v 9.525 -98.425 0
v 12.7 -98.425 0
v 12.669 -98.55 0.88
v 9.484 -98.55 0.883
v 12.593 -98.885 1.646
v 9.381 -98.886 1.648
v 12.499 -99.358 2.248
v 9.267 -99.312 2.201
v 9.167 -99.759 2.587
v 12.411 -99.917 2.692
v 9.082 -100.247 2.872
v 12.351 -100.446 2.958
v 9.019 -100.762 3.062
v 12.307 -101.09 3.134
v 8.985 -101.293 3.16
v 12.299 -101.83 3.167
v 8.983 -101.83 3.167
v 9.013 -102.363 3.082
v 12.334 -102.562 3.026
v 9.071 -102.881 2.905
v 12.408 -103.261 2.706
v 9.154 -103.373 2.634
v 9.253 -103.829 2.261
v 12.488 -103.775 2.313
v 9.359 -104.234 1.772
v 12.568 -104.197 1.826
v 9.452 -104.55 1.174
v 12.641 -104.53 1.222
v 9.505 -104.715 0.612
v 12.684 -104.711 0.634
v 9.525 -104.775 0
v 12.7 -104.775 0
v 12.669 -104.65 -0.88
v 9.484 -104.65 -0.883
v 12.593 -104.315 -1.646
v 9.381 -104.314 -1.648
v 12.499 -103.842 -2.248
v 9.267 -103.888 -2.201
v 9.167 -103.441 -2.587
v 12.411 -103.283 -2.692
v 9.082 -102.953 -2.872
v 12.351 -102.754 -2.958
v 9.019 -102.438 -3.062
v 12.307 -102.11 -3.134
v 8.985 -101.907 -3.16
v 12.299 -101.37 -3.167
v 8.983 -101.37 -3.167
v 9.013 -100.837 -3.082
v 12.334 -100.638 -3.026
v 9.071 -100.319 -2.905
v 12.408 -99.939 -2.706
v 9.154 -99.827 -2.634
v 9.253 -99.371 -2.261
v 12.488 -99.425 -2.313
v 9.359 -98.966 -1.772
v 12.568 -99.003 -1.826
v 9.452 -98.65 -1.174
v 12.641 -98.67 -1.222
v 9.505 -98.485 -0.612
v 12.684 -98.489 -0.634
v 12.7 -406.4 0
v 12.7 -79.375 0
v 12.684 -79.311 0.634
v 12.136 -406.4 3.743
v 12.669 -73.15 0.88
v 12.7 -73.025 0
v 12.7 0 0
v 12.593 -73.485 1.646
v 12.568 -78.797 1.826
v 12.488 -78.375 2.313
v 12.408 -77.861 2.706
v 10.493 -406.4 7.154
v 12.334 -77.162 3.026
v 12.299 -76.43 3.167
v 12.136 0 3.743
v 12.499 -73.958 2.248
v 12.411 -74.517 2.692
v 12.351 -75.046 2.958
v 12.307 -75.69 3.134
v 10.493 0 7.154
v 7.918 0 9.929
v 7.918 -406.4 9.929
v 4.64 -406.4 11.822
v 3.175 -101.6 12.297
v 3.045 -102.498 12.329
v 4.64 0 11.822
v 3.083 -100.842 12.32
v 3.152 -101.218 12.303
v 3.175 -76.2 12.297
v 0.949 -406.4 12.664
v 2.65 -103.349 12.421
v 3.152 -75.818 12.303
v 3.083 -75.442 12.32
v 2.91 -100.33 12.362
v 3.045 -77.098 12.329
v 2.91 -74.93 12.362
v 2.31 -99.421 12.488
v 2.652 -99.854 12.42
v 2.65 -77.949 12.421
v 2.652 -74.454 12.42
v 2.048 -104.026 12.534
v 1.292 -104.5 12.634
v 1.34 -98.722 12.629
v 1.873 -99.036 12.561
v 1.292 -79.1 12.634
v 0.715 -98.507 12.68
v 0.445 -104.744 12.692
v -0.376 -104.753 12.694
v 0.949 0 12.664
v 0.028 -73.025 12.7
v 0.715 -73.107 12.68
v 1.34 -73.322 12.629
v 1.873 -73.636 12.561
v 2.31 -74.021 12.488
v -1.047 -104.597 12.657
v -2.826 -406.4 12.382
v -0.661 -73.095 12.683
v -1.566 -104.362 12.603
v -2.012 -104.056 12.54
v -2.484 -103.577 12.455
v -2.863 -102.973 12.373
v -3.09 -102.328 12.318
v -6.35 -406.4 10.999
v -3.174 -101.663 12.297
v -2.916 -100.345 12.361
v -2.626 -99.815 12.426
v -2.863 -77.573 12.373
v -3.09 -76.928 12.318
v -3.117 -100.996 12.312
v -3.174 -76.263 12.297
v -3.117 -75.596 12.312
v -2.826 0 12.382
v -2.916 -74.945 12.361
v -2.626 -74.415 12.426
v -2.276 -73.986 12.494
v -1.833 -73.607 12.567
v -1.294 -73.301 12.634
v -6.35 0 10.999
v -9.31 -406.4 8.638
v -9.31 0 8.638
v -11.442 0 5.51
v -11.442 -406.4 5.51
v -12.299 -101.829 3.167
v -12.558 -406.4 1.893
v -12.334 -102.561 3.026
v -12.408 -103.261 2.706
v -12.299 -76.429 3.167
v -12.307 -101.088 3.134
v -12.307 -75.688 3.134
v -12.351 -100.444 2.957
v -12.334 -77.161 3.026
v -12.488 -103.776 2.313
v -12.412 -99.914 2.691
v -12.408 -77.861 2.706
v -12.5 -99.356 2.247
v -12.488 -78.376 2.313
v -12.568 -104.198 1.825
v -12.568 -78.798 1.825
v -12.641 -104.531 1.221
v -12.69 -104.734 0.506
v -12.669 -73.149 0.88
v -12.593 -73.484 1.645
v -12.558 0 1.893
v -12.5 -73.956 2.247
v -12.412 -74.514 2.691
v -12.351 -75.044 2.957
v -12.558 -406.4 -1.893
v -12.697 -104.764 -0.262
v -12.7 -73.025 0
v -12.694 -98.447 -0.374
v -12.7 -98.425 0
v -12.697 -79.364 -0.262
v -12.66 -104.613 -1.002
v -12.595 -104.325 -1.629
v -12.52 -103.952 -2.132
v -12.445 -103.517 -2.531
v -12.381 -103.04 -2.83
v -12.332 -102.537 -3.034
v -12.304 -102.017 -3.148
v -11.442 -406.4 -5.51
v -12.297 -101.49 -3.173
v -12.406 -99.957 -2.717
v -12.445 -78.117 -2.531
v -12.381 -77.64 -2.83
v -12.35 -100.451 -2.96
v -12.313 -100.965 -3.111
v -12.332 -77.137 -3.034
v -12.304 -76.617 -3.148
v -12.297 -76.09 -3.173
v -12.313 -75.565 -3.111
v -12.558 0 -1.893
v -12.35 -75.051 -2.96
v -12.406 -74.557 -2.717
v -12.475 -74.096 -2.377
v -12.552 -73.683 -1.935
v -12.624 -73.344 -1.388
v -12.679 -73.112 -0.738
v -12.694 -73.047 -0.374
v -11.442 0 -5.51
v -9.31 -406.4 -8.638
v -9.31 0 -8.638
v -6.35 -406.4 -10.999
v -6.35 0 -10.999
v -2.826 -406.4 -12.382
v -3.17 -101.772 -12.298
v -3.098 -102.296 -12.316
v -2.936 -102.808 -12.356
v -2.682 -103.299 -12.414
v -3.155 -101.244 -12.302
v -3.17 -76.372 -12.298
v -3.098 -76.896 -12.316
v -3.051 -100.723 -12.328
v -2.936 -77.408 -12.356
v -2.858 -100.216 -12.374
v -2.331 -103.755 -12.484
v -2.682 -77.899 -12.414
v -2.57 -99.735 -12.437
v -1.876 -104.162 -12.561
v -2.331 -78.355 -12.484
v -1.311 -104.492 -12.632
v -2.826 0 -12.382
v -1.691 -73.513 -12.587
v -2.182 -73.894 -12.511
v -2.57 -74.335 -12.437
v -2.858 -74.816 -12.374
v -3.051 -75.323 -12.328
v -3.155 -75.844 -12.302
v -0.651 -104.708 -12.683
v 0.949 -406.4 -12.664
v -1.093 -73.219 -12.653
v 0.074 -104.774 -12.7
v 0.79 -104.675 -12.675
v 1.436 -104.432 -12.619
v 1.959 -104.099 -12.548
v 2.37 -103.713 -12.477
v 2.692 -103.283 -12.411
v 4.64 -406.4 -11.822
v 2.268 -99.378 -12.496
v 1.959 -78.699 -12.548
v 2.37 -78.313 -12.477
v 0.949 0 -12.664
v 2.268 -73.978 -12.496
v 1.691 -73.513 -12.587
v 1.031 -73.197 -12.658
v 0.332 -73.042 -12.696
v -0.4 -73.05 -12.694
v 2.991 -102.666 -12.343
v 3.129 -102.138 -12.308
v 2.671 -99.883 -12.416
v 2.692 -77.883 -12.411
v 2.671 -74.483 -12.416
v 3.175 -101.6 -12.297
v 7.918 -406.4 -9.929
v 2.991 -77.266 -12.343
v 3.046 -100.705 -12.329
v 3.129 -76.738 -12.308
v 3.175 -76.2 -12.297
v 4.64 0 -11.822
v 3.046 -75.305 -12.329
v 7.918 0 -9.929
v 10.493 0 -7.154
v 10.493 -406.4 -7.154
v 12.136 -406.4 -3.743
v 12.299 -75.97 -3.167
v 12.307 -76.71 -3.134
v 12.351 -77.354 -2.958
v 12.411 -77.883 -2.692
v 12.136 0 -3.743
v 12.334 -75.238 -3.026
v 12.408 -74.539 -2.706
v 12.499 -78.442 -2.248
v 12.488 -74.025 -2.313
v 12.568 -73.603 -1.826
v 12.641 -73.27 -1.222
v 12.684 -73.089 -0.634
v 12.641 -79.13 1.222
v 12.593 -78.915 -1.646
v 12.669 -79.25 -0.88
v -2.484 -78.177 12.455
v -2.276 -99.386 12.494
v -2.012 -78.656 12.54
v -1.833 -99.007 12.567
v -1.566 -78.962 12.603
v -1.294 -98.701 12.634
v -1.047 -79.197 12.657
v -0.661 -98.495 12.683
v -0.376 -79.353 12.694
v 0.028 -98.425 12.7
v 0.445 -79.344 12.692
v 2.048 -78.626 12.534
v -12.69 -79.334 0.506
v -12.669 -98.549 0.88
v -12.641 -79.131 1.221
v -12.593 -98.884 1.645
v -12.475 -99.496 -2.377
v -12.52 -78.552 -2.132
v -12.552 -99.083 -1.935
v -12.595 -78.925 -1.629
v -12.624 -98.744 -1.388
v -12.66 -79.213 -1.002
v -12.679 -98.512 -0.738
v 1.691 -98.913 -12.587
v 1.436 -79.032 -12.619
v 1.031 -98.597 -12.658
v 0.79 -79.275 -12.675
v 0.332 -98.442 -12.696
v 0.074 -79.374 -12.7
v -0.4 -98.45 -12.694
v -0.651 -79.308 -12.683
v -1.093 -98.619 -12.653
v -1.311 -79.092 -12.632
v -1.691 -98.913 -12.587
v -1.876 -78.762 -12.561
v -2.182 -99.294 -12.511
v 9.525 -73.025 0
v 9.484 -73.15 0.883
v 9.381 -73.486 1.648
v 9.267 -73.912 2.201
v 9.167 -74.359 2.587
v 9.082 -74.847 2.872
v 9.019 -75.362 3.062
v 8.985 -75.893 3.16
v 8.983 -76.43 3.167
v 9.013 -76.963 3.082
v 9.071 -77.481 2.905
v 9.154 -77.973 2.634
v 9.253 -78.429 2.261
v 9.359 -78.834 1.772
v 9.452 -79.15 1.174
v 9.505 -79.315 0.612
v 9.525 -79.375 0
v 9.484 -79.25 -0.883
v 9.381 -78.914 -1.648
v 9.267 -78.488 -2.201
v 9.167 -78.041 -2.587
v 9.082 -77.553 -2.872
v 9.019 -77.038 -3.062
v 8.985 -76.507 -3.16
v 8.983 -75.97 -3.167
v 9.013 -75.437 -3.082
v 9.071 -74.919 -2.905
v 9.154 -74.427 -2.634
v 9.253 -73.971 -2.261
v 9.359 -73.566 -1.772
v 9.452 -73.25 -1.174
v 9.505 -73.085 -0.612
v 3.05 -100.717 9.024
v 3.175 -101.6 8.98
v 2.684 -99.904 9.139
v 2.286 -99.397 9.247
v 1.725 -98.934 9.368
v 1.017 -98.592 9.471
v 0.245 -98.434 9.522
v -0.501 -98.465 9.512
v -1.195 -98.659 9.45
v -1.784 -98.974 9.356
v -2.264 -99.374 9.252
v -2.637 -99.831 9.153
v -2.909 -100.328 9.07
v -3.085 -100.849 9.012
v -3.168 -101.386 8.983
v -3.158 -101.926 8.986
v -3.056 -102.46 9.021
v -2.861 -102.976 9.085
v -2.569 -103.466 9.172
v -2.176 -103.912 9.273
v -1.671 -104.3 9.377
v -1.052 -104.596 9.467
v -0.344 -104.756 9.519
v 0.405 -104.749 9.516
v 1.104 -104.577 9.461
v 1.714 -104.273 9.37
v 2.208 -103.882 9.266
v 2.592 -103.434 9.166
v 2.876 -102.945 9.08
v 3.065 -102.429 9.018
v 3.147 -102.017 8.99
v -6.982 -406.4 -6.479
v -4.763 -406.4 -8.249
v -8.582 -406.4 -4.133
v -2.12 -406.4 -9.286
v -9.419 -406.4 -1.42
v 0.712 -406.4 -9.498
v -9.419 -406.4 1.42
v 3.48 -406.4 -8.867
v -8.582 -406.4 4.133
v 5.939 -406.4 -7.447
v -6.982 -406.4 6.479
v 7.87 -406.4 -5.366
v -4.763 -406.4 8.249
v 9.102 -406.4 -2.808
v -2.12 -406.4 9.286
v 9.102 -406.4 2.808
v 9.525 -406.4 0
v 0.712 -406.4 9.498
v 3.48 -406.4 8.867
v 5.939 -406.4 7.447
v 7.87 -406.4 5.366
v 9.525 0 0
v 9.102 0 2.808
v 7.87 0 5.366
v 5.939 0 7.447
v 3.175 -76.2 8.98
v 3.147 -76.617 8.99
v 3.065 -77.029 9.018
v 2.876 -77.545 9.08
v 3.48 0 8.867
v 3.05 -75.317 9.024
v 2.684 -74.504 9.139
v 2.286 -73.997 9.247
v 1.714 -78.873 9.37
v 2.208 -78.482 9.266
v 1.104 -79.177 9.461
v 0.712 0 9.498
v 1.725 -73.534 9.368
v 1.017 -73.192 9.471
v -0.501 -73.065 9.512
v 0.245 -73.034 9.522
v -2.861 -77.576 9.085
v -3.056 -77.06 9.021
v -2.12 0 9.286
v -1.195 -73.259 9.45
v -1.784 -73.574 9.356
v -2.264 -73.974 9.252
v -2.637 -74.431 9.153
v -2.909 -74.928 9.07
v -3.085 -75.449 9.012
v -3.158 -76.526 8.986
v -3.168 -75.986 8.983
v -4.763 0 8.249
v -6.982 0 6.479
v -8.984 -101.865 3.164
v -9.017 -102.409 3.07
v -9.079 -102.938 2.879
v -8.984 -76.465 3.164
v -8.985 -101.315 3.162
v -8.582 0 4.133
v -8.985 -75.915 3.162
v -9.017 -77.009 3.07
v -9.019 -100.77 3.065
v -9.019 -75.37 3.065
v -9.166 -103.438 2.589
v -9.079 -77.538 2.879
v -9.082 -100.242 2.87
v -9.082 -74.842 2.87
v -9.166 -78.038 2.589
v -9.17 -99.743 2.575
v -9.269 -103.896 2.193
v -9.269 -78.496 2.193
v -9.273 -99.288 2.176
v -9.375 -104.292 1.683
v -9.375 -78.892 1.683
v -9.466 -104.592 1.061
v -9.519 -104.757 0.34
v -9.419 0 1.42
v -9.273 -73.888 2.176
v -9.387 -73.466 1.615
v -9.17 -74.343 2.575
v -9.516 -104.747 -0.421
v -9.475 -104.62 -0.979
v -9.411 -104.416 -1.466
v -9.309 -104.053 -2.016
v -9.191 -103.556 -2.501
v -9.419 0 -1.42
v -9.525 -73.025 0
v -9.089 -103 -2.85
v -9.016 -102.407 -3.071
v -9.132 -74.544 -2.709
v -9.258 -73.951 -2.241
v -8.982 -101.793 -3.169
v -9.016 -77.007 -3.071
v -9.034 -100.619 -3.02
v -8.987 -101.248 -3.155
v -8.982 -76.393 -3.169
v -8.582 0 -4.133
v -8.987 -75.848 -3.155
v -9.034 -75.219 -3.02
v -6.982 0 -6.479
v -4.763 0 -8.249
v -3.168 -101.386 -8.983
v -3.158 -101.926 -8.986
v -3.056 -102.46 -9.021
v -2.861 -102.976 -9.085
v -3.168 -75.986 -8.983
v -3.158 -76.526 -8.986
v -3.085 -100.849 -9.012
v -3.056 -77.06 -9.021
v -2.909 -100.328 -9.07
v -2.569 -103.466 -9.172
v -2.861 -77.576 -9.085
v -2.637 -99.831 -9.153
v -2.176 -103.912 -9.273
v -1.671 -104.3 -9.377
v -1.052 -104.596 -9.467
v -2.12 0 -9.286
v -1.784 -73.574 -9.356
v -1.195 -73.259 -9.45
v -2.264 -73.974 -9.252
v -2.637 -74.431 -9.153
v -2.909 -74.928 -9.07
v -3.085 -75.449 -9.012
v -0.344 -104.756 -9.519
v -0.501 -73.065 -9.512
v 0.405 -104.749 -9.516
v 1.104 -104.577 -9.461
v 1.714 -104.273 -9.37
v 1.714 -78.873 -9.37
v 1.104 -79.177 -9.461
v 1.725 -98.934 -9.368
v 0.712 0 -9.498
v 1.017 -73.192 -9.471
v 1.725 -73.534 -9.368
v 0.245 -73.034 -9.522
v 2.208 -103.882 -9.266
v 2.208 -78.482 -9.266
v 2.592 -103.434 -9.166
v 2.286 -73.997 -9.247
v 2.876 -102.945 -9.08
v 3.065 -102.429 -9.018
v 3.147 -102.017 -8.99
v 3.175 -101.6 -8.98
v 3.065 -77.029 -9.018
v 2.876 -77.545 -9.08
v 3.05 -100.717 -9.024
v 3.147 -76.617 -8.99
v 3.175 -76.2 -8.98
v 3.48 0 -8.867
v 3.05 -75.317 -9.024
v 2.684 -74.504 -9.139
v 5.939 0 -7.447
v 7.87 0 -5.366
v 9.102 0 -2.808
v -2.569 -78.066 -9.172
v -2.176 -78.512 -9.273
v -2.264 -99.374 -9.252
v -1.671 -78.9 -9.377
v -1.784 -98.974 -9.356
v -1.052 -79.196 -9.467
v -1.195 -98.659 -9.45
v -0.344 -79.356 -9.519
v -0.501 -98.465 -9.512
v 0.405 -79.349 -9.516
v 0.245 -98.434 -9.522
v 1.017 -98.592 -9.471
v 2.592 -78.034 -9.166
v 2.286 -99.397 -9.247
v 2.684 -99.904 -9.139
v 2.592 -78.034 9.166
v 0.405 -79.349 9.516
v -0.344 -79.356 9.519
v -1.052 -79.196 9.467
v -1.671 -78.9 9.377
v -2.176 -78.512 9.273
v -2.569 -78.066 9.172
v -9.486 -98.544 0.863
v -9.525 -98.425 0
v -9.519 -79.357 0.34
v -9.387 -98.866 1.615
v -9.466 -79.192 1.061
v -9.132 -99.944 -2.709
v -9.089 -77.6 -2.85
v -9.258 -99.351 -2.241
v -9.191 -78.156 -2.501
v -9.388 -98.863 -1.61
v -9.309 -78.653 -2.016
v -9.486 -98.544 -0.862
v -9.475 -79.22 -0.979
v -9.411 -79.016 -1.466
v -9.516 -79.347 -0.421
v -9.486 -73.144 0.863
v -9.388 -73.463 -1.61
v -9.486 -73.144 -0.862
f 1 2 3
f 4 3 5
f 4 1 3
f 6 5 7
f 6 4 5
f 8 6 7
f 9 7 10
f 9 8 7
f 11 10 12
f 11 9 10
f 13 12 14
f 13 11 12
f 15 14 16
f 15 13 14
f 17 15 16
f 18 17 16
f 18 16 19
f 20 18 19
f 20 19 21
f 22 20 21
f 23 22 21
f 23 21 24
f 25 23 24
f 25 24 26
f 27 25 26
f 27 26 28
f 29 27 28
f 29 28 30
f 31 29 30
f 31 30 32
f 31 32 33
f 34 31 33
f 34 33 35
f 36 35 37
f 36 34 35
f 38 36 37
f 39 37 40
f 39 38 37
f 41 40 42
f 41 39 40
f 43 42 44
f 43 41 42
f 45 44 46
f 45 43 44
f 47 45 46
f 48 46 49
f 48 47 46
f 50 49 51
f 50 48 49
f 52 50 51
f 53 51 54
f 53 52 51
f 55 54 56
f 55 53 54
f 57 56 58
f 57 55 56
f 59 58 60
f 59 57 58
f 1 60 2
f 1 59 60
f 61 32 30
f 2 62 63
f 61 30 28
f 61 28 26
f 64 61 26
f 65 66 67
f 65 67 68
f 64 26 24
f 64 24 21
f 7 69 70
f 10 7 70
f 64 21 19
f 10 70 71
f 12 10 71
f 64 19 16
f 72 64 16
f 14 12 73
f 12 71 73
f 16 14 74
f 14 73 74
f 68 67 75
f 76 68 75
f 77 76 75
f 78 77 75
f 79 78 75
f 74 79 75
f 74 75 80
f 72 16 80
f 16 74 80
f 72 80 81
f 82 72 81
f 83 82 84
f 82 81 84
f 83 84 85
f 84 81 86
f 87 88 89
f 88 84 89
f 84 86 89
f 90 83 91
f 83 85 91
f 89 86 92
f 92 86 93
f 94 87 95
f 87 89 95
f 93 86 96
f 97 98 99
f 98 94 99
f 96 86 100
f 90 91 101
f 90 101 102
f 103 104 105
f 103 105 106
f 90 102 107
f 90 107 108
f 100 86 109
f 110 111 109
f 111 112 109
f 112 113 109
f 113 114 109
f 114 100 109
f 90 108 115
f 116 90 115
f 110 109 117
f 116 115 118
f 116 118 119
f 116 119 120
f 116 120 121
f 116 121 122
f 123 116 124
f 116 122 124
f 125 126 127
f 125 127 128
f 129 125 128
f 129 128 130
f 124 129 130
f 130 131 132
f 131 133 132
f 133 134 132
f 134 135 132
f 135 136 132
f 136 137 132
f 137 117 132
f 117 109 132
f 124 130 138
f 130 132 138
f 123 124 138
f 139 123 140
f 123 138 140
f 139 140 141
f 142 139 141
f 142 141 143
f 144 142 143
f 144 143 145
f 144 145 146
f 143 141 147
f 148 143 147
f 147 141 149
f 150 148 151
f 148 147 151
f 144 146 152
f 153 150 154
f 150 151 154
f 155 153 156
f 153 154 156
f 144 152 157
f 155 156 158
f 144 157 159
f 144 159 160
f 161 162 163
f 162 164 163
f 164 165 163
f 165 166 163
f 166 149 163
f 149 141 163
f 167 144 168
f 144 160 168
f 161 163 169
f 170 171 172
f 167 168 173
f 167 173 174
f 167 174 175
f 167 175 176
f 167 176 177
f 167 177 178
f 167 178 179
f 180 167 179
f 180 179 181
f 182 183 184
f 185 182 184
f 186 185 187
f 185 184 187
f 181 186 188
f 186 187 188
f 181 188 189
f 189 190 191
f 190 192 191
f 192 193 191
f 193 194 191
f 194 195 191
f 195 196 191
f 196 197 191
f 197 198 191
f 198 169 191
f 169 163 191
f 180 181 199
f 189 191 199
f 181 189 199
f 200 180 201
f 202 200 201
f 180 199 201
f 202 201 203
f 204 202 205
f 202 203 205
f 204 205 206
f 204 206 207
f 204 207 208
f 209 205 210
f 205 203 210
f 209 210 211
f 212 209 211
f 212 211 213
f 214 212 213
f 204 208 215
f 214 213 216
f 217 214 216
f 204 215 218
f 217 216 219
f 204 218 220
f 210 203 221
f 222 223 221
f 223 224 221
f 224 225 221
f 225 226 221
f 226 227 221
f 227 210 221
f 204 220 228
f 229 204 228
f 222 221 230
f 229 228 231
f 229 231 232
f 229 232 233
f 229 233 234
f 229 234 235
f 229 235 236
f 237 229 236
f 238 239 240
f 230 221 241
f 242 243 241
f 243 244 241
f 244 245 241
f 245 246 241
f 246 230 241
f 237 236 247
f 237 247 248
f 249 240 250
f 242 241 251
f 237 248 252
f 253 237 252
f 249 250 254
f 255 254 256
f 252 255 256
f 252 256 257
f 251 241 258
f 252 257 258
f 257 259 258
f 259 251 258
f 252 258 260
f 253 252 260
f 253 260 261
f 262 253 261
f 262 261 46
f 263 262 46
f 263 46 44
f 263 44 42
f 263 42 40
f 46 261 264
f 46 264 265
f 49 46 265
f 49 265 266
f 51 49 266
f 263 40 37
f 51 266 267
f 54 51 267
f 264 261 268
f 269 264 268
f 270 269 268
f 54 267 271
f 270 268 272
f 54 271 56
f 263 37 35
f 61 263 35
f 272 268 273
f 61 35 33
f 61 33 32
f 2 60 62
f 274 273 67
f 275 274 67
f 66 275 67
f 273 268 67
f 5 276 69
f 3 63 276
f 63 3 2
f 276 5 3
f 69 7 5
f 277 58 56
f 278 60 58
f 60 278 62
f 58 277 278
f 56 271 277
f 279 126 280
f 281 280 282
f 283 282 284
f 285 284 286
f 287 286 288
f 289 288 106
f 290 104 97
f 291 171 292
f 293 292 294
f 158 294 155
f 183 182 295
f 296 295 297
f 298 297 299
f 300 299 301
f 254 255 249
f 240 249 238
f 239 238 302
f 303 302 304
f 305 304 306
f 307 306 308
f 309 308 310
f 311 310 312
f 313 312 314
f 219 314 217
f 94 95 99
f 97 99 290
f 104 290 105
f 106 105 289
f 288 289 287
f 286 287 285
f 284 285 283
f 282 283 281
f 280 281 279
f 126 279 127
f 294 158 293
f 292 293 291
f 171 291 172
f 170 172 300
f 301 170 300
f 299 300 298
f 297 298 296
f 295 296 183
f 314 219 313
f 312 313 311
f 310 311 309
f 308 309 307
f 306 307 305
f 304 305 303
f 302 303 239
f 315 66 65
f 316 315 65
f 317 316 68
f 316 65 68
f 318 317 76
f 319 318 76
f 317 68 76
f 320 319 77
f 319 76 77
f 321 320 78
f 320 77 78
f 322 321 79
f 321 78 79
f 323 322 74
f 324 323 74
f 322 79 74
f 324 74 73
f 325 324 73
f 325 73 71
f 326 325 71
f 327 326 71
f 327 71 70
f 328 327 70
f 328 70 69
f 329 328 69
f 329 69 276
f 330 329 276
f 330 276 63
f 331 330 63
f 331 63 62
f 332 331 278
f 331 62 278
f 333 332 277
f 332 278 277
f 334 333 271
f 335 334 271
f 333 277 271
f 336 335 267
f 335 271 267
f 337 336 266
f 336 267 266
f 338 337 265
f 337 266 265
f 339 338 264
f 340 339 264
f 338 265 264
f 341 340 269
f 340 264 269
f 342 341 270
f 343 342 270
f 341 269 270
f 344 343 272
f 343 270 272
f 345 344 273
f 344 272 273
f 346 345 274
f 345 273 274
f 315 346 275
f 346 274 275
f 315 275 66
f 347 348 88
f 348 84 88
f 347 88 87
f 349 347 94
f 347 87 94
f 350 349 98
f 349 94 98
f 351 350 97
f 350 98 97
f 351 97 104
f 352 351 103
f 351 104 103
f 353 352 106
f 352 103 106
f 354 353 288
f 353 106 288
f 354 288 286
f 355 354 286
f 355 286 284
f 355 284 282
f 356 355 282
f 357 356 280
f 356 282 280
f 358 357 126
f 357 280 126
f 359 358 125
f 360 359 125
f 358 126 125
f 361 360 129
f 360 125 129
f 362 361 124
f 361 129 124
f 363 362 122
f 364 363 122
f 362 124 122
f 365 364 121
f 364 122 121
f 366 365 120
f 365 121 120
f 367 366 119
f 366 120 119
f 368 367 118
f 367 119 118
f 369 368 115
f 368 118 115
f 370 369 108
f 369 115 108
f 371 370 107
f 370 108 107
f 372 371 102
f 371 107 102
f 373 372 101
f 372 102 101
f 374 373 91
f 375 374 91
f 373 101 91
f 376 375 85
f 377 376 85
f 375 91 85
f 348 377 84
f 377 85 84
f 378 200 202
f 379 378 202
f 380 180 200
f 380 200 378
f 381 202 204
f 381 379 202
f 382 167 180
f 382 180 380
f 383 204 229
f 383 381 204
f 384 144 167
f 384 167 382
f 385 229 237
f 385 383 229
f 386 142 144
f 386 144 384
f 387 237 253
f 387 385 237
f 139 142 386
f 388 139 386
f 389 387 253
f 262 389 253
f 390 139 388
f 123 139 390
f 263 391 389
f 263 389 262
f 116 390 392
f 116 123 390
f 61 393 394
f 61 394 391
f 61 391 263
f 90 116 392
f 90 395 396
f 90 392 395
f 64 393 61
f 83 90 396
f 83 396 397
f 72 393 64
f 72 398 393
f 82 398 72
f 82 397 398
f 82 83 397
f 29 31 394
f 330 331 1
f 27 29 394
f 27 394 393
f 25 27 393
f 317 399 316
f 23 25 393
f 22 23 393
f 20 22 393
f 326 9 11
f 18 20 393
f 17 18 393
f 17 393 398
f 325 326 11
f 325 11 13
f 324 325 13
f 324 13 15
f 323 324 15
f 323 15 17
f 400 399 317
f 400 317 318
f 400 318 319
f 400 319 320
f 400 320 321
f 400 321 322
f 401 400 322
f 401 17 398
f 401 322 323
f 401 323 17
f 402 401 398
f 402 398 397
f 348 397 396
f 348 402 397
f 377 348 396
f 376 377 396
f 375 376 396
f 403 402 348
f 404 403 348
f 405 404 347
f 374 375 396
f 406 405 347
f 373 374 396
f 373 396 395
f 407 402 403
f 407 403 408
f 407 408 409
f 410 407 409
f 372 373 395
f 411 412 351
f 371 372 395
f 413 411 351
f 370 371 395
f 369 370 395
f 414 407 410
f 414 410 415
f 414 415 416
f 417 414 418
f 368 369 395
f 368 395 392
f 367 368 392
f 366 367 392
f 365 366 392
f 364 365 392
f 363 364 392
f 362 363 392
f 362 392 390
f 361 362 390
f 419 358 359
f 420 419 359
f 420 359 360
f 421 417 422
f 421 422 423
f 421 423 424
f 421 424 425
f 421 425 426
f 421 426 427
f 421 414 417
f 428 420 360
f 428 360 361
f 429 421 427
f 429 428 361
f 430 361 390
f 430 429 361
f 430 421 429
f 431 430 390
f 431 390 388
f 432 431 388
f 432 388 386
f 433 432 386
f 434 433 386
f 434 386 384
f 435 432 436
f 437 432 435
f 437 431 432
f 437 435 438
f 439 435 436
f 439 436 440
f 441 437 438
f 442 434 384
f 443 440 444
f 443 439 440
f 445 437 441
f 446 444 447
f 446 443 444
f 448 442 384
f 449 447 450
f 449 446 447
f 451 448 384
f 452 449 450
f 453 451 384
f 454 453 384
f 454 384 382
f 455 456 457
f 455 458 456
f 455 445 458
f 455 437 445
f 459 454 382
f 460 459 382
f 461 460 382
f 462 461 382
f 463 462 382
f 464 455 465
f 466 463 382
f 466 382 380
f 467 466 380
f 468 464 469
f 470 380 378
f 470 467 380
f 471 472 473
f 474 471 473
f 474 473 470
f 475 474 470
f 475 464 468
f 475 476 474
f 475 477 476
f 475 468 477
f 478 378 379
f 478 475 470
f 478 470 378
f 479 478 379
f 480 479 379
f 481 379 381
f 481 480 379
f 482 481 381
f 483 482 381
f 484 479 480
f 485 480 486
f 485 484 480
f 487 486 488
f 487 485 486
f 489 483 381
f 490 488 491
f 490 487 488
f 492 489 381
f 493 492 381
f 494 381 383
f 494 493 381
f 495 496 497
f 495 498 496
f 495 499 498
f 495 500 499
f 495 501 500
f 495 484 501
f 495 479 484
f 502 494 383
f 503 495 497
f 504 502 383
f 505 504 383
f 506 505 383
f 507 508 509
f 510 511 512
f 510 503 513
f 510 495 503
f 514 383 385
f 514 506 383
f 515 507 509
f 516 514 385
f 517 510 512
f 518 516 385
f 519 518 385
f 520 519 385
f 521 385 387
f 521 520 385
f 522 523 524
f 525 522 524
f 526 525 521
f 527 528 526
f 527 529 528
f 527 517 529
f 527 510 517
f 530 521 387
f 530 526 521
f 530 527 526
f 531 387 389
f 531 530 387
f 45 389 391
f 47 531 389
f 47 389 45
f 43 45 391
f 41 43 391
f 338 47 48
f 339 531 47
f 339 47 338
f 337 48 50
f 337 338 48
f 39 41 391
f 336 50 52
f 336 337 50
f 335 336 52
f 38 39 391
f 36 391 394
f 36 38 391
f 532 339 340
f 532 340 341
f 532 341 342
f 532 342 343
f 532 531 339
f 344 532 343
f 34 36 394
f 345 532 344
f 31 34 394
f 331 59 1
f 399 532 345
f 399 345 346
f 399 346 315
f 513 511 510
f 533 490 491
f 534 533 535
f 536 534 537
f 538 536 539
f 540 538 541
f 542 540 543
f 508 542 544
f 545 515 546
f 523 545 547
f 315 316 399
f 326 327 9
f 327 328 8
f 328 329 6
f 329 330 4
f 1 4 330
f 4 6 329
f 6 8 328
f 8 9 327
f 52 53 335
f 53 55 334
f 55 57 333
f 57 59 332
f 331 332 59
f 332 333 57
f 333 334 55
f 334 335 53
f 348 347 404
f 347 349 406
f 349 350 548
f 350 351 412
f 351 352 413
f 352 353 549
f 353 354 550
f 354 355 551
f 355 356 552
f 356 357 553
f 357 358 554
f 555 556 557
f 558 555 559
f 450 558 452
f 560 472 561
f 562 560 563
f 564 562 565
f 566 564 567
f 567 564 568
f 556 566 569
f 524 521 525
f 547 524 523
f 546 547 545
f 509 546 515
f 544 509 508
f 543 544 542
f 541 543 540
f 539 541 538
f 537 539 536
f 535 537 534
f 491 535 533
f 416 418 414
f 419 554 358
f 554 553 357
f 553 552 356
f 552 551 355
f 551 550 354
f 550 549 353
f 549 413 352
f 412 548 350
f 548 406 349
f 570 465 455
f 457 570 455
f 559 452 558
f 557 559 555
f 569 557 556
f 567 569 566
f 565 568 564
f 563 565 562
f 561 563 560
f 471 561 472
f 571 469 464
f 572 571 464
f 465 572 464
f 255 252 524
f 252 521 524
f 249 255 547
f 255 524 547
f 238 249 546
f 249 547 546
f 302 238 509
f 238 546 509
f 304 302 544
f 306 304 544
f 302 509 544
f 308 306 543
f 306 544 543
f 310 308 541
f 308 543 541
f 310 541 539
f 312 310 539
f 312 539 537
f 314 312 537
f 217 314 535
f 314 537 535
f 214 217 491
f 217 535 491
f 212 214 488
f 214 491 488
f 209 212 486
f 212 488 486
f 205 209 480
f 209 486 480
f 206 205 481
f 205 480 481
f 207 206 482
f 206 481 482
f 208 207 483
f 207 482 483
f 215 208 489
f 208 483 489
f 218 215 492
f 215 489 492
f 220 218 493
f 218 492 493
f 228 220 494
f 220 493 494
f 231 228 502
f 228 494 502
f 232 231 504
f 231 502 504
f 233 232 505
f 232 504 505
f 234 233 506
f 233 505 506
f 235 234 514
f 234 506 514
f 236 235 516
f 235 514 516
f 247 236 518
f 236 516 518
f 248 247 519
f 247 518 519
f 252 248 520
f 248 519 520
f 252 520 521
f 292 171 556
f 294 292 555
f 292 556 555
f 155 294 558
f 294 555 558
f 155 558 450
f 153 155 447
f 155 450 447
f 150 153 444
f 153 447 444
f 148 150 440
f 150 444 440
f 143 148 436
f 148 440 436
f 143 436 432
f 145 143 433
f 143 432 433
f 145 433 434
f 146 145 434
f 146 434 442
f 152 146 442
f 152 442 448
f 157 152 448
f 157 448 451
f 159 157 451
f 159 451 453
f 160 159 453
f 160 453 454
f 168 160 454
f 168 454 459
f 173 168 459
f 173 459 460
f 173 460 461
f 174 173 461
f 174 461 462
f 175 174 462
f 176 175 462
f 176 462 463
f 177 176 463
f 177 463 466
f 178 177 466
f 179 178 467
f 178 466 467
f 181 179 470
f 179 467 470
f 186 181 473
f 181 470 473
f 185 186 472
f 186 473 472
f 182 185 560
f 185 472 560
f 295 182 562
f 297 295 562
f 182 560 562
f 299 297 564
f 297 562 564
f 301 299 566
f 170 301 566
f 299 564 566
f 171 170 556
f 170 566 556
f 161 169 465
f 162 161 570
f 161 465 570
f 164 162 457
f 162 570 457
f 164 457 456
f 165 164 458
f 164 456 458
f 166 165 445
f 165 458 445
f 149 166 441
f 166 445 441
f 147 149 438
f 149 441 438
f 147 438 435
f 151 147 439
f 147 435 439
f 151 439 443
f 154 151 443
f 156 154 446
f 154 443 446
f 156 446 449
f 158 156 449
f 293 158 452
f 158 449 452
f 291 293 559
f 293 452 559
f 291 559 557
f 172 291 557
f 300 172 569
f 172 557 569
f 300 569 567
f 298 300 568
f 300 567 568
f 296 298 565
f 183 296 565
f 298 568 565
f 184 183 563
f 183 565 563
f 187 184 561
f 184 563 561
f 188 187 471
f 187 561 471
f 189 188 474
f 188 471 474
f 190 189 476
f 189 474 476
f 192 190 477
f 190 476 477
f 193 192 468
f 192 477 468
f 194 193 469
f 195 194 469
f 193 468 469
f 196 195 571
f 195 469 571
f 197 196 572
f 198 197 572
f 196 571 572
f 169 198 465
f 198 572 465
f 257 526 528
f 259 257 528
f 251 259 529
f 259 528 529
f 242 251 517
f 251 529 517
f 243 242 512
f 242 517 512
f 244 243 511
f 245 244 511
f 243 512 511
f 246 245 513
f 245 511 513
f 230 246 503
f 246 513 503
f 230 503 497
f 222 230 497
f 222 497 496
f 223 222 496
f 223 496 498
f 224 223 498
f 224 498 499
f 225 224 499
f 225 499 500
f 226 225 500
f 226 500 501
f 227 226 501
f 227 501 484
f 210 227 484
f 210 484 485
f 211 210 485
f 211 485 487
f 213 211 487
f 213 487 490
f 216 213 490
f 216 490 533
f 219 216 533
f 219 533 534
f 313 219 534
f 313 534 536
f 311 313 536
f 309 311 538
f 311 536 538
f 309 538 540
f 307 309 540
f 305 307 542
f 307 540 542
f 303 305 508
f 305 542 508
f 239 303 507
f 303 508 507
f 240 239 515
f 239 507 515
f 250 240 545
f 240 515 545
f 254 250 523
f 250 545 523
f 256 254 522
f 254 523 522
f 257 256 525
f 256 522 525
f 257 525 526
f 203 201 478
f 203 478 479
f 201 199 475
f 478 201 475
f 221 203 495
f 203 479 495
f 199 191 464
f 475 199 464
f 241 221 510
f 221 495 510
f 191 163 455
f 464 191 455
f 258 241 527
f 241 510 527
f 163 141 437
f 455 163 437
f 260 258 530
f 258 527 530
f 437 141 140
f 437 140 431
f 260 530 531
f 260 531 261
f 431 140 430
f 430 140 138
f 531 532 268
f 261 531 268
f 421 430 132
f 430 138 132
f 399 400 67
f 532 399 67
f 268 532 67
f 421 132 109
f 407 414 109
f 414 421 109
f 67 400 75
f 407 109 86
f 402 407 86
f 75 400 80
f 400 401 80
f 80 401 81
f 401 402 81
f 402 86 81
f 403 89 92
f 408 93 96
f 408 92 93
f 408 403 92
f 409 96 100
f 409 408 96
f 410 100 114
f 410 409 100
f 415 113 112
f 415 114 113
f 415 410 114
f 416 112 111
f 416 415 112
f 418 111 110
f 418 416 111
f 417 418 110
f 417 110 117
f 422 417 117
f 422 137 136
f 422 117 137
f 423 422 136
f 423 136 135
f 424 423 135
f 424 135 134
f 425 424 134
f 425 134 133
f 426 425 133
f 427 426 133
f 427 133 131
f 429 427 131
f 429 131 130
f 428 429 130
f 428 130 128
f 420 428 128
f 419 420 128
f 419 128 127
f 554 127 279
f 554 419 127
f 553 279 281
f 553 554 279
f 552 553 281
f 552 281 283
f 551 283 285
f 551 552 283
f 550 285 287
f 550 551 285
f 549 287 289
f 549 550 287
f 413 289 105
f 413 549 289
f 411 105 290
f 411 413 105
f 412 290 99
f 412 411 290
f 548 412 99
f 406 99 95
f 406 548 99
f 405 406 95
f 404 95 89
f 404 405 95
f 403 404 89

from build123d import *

# Parameters (mm, degrees)
F0_R     = 12.7
F0_R_2   = 9.525
F1_DEPTH = 406.4
F2_R     = 3.175
F3_DEPTH = 12.7
F4_R     = 3.175
F5_DEPTH = 12.7


with BuildPart() as f1:
    # F0 (on Front) → F1 (new body)
    with BuildSketch(Plane.XZ):
        Circle(F0_R)
        Circle(F0_R_2, mode=Mode.SUBTRACT)
    extrude(amount=F1_DEPTH)

    # F2 (on Right) → F3 (cut, symmetric)
    with BuildSketch(Plane.YZ):
        with Locations((-101.6, 0)):
            Circle(F2_R)
        with Locations((-76.2, 0)):
            Circle(F2_R)
    extrude(amount=F3_DEPTH, both=True, mode=Mode.SUBTRACT)

    # F4 (on Top) → F5 (cut, symmetric)
    with BuildSketch(Plane.XY):
        with Locations((0, -76.2)):
            Circle(F4_R)
        with Locations((0, -101.6)):
            Circle(F4_R)
    extrude(amount=F5_DEPTH, both=True, mode=Mode.SUBTRACT)


solid = f1.part
